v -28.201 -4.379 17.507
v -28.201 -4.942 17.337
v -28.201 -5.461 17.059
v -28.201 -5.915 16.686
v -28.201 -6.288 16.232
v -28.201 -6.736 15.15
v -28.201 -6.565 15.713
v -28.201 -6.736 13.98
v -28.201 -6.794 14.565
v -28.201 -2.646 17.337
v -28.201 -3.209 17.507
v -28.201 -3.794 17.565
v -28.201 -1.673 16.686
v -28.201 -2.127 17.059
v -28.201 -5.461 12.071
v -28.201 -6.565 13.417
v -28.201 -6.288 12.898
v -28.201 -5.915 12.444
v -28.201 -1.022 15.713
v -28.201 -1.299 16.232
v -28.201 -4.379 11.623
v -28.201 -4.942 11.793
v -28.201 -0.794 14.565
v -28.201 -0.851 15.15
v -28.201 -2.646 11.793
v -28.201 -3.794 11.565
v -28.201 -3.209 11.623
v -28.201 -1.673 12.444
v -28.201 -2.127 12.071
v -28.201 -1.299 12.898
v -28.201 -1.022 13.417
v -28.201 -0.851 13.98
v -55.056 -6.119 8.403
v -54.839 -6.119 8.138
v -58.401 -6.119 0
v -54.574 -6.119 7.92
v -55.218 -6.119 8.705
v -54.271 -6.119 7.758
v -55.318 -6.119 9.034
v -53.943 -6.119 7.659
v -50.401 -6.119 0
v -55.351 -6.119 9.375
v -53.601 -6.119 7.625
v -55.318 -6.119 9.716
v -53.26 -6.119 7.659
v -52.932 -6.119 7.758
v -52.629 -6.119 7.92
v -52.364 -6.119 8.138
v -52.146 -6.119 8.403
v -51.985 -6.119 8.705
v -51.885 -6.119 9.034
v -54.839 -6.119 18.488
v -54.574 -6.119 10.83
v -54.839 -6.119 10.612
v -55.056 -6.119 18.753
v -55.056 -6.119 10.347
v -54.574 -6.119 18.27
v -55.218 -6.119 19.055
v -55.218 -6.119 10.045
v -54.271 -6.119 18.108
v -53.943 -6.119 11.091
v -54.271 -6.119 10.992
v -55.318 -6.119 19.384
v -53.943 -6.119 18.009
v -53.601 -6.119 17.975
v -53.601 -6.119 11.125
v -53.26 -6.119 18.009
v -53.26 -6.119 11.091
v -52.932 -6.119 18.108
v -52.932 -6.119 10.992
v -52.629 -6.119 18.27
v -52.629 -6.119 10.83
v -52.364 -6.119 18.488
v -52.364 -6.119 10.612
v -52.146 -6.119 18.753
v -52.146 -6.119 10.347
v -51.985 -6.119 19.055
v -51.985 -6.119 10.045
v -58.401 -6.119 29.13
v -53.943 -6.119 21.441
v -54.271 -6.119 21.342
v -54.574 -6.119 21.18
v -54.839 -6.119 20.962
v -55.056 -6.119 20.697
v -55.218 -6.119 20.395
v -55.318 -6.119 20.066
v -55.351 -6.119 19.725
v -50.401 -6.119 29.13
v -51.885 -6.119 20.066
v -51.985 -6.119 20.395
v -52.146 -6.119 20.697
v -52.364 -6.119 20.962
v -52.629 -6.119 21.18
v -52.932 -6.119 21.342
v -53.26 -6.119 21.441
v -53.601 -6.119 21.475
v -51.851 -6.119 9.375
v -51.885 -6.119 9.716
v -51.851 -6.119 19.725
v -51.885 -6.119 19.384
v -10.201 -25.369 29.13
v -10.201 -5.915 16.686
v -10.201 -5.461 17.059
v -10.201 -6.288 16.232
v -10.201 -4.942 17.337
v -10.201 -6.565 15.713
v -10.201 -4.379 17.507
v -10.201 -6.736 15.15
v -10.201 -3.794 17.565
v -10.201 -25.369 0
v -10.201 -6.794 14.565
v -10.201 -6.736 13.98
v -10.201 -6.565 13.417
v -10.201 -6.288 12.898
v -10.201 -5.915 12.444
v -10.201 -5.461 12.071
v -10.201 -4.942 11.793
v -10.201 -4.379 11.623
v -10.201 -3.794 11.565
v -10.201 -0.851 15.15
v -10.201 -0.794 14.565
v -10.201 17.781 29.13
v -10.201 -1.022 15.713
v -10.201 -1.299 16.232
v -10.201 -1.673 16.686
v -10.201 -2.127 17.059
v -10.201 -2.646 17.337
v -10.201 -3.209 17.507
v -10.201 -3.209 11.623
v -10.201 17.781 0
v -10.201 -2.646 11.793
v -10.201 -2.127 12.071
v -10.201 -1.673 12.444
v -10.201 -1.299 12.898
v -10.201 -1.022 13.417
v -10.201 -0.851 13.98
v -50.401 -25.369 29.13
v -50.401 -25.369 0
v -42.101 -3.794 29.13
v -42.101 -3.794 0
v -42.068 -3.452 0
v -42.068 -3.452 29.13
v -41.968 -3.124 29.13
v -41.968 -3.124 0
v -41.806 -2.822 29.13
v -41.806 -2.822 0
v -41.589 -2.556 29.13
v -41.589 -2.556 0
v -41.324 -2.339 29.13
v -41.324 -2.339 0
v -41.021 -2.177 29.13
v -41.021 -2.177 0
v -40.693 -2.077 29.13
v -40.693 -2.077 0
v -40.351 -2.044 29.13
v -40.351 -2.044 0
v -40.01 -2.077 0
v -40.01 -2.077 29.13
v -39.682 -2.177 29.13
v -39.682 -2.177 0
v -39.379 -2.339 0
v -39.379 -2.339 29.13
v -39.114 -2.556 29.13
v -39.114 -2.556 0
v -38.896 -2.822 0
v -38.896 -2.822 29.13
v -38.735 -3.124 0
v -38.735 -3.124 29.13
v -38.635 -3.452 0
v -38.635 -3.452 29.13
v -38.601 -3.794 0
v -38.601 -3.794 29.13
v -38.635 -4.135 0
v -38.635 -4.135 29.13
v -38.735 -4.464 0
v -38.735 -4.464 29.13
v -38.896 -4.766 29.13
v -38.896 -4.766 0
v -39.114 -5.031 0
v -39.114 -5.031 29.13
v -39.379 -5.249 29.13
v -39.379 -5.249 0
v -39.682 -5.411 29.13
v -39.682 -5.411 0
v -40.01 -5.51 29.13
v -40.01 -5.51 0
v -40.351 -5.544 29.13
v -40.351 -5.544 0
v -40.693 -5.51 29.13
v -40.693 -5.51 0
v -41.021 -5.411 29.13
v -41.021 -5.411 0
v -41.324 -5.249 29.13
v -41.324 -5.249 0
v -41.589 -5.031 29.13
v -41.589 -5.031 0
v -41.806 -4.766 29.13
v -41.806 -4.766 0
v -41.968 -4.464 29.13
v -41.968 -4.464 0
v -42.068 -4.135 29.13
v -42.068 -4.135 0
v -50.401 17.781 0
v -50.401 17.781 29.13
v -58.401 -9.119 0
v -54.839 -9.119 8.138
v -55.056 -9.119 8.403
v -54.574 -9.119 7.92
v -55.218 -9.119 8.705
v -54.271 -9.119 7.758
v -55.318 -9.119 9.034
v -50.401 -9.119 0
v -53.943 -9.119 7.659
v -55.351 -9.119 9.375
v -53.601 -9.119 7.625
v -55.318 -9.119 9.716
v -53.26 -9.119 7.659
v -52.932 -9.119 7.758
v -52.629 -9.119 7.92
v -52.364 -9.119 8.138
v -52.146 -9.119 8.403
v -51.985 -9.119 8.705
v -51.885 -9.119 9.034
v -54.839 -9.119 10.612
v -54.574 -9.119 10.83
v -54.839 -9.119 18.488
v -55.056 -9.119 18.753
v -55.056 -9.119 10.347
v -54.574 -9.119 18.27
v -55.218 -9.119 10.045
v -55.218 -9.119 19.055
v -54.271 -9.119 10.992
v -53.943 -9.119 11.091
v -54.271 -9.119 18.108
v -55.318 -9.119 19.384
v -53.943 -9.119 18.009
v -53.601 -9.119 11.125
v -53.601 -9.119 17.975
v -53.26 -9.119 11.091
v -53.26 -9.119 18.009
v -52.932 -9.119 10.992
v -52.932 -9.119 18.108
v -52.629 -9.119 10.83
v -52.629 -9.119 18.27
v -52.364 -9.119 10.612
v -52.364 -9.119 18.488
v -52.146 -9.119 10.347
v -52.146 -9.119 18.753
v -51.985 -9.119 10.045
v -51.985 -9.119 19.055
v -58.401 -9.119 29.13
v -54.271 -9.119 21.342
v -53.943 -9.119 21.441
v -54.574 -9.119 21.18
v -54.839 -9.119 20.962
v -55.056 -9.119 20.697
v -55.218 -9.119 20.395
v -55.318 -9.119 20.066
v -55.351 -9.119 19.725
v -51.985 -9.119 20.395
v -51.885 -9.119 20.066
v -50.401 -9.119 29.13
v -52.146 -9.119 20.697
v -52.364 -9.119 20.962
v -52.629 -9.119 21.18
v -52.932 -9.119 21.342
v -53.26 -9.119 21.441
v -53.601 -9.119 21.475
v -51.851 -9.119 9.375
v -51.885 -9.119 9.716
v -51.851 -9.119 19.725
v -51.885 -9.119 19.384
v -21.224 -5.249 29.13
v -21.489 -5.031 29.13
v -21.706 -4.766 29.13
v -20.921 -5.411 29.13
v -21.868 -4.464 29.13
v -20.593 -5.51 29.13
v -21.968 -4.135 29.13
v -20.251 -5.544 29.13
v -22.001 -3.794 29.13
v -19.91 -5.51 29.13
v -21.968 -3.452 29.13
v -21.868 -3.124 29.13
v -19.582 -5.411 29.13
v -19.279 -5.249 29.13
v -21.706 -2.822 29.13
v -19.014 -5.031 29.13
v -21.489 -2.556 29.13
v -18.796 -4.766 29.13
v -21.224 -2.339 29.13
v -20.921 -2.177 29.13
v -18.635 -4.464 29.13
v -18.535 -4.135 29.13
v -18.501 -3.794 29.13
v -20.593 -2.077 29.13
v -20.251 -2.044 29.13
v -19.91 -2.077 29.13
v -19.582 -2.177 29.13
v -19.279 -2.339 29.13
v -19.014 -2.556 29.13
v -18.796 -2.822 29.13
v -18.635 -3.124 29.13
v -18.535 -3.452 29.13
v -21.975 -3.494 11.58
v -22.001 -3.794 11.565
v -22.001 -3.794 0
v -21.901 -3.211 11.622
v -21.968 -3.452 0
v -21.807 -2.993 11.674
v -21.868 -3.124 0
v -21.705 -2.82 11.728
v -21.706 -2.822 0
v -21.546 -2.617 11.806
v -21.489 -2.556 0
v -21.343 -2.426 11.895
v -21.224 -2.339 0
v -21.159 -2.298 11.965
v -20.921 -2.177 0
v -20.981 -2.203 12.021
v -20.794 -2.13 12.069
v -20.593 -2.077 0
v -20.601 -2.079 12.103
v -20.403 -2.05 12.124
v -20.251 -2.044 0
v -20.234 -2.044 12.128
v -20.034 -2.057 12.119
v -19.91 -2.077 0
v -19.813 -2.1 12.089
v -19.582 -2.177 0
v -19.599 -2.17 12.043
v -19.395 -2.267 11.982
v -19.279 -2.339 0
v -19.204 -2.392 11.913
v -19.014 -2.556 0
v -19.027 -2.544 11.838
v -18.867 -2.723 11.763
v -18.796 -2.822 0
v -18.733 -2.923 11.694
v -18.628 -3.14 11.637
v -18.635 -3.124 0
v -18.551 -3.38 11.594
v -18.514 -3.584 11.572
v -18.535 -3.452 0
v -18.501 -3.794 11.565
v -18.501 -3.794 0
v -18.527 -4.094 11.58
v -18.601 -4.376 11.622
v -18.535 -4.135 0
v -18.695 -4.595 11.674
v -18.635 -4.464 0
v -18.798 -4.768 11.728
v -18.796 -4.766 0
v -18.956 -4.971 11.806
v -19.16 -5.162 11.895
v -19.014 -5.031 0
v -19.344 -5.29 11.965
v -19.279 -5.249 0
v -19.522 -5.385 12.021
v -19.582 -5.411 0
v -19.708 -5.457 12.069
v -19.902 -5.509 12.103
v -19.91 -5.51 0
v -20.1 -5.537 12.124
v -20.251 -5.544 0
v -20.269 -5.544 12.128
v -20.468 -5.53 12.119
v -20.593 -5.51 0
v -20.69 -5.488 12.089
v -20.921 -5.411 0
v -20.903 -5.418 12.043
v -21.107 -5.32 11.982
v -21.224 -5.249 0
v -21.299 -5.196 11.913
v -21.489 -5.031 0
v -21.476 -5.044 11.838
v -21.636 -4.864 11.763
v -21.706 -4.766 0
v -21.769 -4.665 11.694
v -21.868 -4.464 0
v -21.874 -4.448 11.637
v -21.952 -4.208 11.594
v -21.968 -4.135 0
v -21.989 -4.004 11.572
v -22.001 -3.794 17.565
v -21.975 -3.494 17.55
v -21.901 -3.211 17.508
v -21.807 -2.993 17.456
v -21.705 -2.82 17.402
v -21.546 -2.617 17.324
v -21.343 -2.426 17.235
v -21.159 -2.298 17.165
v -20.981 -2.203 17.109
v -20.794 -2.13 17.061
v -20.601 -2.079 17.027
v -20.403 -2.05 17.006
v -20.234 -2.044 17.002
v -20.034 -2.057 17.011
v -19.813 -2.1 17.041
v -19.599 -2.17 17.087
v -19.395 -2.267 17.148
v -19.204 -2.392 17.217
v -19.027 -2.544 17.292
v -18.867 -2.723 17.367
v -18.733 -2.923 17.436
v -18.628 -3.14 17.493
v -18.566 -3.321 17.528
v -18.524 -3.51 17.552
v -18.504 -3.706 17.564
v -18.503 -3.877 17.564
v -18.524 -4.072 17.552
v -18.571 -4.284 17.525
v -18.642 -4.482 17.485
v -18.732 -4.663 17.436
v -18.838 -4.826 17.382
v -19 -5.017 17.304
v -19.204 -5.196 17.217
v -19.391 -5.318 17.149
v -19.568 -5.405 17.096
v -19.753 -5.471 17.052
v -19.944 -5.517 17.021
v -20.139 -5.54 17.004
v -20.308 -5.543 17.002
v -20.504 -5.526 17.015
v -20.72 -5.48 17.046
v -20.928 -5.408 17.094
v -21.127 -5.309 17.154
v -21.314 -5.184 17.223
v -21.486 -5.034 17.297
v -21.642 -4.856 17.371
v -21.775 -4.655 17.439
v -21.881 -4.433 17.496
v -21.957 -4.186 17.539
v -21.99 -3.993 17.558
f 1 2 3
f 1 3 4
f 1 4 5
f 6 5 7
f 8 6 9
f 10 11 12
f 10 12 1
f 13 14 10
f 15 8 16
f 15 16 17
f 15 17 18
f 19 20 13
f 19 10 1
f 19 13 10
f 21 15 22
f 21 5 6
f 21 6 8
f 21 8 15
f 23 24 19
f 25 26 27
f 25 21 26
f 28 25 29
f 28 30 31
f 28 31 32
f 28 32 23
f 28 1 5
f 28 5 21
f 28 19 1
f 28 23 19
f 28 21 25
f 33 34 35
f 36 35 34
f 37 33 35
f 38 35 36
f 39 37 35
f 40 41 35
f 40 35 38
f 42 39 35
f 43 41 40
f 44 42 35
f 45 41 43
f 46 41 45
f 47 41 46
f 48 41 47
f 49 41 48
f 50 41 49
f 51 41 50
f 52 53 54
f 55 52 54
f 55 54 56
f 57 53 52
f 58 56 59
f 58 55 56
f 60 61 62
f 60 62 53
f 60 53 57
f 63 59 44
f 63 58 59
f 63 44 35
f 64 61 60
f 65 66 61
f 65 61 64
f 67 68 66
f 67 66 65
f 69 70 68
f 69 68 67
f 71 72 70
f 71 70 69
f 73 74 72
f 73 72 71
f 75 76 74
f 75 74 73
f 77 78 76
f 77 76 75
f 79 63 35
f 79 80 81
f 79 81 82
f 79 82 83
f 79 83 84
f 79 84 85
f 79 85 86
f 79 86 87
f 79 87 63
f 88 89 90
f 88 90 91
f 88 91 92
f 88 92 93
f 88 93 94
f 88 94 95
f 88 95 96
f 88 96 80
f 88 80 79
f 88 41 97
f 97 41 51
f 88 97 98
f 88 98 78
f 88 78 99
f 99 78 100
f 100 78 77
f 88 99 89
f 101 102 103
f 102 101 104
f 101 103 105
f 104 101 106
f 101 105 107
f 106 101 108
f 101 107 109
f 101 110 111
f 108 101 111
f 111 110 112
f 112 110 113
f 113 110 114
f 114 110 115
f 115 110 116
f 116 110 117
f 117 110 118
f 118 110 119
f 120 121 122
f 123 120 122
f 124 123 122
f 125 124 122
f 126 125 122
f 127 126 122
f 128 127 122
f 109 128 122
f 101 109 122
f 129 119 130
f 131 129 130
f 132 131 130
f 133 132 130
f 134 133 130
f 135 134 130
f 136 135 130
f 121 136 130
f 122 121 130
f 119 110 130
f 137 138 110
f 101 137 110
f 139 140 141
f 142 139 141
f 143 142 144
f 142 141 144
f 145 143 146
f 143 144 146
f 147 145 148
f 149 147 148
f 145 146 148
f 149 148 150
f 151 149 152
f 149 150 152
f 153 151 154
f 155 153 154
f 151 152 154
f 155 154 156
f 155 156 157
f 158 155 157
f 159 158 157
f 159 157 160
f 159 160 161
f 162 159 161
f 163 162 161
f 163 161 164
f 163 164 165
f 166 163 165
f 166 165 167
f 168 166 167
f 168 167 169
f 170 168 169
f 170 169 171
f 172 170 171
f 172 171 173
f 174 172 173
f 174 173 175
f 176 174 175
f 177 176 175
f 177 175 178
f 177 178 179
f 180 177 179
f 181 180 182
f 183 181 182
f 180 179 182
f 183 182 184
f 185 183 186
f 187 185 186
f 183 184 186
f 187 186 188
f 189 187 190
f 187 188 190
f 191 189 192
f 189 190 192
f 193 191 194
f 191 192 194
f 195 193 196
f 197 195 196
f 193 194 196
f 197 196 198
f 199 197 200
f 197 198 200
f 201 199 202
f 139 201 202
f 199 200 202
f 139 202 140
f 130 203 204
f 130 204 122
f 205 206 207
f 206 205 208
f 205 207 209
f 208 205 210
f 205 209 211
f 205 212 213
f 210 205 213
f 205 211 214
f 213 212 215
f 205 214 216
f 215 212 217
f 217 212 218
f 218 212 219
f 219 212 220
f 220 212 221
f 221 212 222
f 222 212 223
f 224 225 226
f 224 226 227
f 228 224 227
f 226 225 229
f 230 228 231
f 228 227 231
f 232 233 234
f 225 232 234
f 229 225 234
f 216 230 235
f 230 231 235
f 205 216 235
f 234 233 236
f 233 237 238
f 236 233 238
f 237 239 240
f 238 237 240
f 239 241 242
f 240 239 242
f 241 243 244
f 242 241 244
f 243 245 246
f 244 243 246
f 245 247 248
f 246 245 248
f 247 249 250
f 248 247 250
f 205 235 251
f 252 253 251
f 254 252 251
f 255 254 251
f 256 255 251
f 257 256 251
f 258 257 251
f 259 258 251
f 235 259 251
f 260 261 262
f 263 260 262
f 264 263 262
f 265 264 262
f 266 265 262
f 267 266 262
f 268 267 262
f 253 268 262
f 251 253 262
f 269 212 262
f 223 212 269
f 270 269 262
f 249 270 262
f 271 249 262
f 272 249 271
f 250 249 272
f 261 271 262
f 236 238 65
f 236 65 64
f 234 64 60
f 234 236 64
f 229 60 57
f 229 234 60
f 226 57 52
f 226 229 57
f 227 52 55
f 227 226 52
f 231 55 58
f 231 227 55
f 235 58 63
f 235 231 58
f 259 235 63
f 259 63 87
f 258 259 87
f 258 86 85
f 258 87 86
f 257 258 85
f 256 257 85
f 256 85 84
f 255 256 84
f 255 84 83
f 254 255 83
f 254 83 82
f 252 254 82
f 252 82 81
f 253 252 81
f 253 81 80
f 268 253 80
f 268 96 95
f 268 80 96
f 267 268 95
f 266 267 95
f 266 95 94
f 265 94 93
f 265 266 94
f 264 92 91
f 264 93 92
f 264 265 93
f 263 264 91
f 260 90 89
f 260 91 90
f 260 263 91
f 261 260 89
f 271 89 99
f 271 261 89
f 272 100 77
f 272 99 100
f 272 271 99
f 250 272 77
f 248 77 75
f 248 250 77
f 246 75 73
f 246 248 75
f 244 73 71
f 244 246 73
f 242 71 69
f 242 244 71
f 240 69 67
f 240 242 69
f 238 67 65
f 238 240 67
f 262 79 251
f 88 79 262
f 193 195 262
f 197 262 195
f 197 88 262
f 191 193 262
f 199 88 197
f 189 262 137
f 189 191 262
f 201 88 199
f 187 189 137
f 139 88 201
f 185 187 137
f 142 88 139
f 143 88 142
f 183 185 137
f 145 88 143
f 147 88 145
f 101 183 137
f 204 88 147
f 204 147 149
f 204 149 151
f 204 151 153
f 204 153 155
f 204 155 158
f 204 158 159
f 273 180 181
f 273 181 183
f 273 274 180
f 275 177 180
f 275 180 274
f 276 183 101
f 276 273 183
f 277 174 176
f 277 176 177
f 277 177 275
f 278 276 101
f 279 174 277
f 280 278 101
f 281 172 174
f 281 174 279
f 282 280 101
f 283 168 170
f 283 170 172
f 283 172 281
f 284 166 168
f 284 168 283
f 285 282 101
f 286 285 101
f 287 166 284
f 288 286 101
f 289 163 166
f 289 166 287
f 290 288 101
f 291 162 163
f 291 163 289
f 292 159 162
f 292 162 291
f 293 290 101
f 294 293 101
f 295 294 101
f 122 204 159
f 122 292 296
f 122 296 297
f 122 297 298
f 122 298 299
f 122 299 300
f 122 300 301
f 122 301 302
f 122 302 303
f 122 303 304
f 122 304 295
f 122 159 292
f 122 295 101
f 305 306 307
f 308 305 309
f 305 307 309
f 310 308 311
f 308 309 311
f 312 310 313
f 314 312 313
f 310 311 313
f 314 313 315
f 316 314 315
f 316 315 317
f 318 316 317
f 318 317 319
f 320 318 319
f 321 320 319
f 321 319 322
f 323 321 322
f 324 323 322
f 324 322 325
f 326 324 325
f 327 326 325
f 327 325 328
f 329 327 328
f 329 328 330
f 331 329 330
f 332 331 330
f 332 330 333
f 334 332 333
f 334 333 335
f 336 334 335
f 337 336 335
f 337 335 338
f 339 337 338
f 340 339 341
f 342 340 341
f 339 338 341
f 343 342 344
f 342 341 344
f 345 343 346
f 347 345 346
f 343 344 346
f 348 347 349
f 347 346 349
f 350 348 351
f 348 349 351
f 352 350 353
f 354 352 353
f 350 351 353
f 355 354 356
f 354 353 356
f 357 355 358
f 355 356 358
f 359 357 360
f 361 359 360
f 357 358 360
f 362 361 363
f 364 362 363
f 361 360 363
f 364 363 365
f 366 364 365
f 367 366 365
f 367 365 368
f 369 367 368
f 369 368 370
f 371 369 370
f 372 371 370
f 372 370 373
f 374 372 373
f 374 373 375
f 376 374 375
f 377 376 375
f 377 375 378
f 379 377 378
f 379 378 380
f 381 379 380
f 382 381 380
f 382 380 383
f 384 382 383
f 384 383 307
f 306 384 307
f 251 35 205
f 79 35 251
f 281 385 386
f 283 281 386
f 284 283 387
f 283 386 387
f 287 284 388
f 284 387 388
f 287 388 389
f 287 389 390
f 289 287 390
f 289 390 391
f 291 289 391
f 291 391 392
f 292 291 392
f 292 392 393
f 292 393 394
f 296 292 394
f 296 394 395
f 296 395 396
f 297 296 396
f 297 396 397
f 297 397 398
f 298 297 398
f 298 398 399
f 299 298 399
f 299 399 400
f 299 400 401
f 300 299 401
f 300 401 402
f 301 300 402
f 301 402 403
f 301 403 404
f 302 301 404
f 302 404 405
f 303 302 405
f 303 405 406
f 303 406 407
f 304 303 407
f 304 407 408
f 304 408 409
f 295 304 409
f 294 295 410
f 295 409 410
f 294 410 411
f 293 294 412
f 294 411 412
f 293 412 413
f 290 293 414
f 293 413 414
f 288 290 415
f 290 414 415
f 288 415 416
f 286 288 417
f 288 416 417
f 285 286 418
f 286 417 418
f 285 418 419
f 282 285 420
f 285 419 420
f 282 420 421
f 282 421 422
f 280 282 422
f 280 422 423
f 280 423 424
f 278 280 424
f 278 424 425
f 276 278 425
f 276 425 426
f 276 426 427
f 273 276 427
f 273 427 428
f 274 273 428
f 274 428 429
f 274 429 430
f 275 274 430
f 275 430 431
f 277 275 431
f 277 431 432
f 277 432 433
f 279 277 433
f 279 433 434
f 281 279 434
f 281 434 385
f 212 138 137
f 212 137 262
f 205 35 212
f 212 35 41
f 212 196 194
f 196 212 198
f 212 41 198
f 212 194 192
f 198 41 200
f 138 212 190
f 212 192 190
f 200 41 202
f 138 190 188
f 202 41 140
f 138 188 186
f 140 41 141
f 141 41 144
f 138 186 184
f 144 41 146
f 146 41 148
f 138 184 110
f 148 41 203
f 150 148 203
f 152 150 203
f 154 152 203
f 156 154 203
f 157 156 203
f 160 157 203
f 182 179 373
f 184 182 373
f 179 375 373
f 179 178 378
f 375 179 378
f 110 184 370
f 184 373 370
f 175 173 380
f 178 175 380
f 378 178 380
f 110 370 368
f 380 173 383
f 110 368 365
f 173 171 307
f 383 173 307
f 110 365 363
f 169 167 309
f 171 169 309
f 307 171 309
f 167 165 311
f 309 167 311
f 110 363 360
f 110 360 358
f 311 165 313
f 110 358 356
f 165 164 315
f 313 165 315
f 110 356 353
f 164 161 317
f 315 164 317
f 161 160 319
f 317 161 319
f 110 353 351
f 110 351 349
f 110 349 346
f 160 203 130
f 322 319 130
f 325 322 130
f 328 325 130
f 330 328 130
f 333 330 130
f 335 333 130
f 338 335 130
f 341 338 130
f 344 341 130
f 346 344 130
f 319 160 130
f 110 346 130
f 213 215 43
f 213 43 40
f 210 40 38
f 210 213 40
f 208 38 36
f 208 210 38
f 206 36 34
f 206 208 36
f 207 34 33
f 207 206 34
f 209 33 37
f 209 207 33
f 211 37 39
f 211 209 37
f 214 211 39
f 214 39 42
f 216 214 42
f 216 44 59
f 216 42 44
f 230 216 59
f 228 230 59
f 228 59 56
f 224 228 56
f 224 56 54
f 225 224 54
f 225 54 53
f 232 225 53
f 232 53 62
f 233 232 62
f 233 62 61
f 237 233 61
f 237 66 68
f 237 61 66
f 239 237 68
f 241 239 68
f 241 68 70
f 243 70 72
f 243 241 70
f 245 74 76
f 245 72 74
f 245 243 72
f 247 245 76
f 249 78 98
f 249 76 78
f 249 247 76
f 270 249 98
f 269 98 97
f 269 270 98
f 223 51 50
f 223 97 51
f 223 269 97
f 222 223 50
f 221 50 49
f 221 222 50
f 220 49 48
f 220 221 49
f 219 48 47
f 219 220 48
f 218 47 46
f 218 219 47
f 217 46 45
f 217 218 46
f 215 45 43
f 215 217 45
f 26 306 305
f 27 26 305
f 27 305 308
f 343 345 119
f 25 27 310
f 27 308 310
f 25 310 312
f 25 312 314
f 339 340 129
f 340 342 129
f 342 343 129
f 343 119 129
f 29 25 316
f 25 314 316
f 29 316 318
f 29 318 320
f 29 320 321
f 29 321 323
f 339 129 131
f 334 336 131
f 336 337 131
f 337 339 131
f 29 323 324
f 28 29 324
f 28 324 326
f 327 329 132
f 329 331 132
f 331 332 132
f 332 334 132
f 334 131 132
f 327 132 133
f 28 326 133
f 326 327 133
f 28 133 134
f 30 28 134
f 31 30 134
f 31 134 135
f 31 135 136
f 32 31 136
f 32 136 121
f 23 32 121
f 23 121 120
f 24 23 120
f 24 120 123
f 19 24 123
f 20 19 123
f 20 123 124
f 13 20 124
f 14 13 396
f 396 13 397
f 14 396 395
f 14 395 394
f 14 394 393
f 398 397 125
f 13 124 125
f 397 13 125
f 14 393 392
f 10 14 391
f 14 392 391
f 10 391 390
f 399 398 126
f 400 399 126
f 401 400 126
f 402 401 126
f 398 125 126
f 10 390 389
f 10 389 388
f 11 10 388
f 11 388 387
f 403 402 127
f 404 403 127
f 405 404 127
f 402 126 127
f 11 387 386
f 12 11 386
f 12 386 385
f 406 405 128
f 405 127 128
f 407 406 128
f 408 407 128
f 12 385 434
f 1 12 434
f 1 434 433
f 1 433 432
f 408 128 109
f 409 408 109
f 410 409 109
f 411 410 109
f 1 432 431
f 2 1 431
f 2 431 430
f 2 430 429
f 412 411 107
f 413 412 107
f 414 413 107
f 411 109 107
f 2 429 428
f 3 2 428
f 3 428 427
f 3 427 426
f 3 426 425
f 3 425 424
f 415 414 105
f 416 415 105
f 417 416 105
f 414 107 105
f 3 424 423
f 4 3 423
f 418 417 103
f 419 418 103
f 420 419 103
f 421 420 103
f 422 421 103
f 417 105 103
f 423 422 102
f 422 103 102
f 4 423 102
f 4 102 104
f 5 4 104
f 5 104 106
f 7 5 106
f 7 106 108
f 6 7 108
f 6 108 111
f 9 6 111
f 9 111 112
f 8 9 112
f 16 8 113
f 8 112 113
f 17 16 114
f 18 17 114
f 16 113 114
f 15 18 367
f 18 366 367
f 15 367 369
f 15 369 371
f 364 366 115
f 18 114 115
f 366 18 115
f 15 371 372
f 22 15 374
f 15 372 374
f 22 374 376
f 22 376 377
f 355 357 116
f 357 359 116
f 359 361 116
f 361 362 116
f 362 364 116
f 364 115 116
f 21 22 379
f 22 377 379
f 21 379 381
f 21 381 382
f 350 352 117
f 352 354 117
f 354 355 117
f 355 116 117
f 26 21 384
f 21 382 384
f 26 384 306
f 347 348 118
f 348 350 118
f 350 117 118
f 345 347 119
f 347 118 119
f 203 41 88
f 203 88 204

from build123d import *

# Parameters (mm, degrees)
SKETCH2_W               = 40.2
SKETCH2_H               = 43.15
BOSS_EXTRUDE1_DEPTH     = 29.13
SKETCH3_W               = 29.13
SKETCH3_H               = 3
BOSS_EXTRUDE2_DEPTH     = 8
CUT_EXTRUDE1_DEPTH      = 8
CUT_EXTRUDE1_DEPTH_BACK = 8
SKETCH4_R               = 1.75
SKETCH5_R               = 1.75
CUT_EXTRUDE2_DEPTH      = 40
SKETCH6_R               = 3
CUT_EXTRUDE3_DEPTH      = 18


with BuildPart() as part:
    # Sketch2 → Boss-Extrude1 (new body)
    with BuildSketch(Plane.XY):
        with Locations((-30.301325873, -3.793821583)):
            Rectangle(SKETCH2_W, SKETCH2_H)
    extrude(amount=BOSS_EXTRUDE1_DEPTH)

    # Sketch3 → Boss-Extrude2 (add)
    with BuildSketch(Plane.ZY.offset(50.401325873)):
        with Locations((14.565, -7.618821583)):
            Rectangle(SKETCH3_W, SKETCH3_H)
    extrude(amount=BOSS_EXTRUDE2_DEPTH)

    # Sketch4 → Cut-Extrude1 (cut, two sides: drawn at the far end of the back side and taken through both)
    with BuildSketch(Plane(origin=(0, -9.118821583, 0), x_dir=(1, 0, 0), z_dir=(0, 1, 0)).offset(-CUT_EXTRUDE1_DEPTH_BACK)):
        with Locations(Location((-53.601325886, -9.375, 0), (0, 0, 90))):
            Circle(SKETCH4_R)
        with Locations(Location((-53.601325886, -19.725, 0), (0, 0, 90))):
            Circle(SKETCH4_R)
    extrude(amount=CUT_EXTRUDE1_DEPTH + CUT_EXTRUDE1_DEPTH_BACK, mode=Mode.SUBTRACT)

    # Sketch5 → Cut-Extrude2 (cut)
    with BuildSketch(Plane(origin=(0, 0, 0), x_dir=(-1, 0, 0), z_dir=(0, 0, -1))):
        with Locations((40.351325873, -3.793821583)):
            Circle(SKETCH5_R)
        with Locations((20.251325873, -3.793821583)):
            Circle(SKETCH5_R)
    extrude(amount=-CUT_EXTRUDE2_DEPTH, mode=Mode.SUBTRACT)

    # Sketch6 → Cut-Extrude3 (cut)
    with BuildSketch(Plane(origin=(-10.201325873, 0, 0), x_dir=(0, 0, -1), z_dir=(1, 0, 0))):
        with Locations((-14.565, -3.793821583)):
            Circle(SKETCH6_R)
    extrude(amount=-CUT_EXTRUDE3_DEPTH, mode=Mode.SUBTRACT)


solid = part.part
